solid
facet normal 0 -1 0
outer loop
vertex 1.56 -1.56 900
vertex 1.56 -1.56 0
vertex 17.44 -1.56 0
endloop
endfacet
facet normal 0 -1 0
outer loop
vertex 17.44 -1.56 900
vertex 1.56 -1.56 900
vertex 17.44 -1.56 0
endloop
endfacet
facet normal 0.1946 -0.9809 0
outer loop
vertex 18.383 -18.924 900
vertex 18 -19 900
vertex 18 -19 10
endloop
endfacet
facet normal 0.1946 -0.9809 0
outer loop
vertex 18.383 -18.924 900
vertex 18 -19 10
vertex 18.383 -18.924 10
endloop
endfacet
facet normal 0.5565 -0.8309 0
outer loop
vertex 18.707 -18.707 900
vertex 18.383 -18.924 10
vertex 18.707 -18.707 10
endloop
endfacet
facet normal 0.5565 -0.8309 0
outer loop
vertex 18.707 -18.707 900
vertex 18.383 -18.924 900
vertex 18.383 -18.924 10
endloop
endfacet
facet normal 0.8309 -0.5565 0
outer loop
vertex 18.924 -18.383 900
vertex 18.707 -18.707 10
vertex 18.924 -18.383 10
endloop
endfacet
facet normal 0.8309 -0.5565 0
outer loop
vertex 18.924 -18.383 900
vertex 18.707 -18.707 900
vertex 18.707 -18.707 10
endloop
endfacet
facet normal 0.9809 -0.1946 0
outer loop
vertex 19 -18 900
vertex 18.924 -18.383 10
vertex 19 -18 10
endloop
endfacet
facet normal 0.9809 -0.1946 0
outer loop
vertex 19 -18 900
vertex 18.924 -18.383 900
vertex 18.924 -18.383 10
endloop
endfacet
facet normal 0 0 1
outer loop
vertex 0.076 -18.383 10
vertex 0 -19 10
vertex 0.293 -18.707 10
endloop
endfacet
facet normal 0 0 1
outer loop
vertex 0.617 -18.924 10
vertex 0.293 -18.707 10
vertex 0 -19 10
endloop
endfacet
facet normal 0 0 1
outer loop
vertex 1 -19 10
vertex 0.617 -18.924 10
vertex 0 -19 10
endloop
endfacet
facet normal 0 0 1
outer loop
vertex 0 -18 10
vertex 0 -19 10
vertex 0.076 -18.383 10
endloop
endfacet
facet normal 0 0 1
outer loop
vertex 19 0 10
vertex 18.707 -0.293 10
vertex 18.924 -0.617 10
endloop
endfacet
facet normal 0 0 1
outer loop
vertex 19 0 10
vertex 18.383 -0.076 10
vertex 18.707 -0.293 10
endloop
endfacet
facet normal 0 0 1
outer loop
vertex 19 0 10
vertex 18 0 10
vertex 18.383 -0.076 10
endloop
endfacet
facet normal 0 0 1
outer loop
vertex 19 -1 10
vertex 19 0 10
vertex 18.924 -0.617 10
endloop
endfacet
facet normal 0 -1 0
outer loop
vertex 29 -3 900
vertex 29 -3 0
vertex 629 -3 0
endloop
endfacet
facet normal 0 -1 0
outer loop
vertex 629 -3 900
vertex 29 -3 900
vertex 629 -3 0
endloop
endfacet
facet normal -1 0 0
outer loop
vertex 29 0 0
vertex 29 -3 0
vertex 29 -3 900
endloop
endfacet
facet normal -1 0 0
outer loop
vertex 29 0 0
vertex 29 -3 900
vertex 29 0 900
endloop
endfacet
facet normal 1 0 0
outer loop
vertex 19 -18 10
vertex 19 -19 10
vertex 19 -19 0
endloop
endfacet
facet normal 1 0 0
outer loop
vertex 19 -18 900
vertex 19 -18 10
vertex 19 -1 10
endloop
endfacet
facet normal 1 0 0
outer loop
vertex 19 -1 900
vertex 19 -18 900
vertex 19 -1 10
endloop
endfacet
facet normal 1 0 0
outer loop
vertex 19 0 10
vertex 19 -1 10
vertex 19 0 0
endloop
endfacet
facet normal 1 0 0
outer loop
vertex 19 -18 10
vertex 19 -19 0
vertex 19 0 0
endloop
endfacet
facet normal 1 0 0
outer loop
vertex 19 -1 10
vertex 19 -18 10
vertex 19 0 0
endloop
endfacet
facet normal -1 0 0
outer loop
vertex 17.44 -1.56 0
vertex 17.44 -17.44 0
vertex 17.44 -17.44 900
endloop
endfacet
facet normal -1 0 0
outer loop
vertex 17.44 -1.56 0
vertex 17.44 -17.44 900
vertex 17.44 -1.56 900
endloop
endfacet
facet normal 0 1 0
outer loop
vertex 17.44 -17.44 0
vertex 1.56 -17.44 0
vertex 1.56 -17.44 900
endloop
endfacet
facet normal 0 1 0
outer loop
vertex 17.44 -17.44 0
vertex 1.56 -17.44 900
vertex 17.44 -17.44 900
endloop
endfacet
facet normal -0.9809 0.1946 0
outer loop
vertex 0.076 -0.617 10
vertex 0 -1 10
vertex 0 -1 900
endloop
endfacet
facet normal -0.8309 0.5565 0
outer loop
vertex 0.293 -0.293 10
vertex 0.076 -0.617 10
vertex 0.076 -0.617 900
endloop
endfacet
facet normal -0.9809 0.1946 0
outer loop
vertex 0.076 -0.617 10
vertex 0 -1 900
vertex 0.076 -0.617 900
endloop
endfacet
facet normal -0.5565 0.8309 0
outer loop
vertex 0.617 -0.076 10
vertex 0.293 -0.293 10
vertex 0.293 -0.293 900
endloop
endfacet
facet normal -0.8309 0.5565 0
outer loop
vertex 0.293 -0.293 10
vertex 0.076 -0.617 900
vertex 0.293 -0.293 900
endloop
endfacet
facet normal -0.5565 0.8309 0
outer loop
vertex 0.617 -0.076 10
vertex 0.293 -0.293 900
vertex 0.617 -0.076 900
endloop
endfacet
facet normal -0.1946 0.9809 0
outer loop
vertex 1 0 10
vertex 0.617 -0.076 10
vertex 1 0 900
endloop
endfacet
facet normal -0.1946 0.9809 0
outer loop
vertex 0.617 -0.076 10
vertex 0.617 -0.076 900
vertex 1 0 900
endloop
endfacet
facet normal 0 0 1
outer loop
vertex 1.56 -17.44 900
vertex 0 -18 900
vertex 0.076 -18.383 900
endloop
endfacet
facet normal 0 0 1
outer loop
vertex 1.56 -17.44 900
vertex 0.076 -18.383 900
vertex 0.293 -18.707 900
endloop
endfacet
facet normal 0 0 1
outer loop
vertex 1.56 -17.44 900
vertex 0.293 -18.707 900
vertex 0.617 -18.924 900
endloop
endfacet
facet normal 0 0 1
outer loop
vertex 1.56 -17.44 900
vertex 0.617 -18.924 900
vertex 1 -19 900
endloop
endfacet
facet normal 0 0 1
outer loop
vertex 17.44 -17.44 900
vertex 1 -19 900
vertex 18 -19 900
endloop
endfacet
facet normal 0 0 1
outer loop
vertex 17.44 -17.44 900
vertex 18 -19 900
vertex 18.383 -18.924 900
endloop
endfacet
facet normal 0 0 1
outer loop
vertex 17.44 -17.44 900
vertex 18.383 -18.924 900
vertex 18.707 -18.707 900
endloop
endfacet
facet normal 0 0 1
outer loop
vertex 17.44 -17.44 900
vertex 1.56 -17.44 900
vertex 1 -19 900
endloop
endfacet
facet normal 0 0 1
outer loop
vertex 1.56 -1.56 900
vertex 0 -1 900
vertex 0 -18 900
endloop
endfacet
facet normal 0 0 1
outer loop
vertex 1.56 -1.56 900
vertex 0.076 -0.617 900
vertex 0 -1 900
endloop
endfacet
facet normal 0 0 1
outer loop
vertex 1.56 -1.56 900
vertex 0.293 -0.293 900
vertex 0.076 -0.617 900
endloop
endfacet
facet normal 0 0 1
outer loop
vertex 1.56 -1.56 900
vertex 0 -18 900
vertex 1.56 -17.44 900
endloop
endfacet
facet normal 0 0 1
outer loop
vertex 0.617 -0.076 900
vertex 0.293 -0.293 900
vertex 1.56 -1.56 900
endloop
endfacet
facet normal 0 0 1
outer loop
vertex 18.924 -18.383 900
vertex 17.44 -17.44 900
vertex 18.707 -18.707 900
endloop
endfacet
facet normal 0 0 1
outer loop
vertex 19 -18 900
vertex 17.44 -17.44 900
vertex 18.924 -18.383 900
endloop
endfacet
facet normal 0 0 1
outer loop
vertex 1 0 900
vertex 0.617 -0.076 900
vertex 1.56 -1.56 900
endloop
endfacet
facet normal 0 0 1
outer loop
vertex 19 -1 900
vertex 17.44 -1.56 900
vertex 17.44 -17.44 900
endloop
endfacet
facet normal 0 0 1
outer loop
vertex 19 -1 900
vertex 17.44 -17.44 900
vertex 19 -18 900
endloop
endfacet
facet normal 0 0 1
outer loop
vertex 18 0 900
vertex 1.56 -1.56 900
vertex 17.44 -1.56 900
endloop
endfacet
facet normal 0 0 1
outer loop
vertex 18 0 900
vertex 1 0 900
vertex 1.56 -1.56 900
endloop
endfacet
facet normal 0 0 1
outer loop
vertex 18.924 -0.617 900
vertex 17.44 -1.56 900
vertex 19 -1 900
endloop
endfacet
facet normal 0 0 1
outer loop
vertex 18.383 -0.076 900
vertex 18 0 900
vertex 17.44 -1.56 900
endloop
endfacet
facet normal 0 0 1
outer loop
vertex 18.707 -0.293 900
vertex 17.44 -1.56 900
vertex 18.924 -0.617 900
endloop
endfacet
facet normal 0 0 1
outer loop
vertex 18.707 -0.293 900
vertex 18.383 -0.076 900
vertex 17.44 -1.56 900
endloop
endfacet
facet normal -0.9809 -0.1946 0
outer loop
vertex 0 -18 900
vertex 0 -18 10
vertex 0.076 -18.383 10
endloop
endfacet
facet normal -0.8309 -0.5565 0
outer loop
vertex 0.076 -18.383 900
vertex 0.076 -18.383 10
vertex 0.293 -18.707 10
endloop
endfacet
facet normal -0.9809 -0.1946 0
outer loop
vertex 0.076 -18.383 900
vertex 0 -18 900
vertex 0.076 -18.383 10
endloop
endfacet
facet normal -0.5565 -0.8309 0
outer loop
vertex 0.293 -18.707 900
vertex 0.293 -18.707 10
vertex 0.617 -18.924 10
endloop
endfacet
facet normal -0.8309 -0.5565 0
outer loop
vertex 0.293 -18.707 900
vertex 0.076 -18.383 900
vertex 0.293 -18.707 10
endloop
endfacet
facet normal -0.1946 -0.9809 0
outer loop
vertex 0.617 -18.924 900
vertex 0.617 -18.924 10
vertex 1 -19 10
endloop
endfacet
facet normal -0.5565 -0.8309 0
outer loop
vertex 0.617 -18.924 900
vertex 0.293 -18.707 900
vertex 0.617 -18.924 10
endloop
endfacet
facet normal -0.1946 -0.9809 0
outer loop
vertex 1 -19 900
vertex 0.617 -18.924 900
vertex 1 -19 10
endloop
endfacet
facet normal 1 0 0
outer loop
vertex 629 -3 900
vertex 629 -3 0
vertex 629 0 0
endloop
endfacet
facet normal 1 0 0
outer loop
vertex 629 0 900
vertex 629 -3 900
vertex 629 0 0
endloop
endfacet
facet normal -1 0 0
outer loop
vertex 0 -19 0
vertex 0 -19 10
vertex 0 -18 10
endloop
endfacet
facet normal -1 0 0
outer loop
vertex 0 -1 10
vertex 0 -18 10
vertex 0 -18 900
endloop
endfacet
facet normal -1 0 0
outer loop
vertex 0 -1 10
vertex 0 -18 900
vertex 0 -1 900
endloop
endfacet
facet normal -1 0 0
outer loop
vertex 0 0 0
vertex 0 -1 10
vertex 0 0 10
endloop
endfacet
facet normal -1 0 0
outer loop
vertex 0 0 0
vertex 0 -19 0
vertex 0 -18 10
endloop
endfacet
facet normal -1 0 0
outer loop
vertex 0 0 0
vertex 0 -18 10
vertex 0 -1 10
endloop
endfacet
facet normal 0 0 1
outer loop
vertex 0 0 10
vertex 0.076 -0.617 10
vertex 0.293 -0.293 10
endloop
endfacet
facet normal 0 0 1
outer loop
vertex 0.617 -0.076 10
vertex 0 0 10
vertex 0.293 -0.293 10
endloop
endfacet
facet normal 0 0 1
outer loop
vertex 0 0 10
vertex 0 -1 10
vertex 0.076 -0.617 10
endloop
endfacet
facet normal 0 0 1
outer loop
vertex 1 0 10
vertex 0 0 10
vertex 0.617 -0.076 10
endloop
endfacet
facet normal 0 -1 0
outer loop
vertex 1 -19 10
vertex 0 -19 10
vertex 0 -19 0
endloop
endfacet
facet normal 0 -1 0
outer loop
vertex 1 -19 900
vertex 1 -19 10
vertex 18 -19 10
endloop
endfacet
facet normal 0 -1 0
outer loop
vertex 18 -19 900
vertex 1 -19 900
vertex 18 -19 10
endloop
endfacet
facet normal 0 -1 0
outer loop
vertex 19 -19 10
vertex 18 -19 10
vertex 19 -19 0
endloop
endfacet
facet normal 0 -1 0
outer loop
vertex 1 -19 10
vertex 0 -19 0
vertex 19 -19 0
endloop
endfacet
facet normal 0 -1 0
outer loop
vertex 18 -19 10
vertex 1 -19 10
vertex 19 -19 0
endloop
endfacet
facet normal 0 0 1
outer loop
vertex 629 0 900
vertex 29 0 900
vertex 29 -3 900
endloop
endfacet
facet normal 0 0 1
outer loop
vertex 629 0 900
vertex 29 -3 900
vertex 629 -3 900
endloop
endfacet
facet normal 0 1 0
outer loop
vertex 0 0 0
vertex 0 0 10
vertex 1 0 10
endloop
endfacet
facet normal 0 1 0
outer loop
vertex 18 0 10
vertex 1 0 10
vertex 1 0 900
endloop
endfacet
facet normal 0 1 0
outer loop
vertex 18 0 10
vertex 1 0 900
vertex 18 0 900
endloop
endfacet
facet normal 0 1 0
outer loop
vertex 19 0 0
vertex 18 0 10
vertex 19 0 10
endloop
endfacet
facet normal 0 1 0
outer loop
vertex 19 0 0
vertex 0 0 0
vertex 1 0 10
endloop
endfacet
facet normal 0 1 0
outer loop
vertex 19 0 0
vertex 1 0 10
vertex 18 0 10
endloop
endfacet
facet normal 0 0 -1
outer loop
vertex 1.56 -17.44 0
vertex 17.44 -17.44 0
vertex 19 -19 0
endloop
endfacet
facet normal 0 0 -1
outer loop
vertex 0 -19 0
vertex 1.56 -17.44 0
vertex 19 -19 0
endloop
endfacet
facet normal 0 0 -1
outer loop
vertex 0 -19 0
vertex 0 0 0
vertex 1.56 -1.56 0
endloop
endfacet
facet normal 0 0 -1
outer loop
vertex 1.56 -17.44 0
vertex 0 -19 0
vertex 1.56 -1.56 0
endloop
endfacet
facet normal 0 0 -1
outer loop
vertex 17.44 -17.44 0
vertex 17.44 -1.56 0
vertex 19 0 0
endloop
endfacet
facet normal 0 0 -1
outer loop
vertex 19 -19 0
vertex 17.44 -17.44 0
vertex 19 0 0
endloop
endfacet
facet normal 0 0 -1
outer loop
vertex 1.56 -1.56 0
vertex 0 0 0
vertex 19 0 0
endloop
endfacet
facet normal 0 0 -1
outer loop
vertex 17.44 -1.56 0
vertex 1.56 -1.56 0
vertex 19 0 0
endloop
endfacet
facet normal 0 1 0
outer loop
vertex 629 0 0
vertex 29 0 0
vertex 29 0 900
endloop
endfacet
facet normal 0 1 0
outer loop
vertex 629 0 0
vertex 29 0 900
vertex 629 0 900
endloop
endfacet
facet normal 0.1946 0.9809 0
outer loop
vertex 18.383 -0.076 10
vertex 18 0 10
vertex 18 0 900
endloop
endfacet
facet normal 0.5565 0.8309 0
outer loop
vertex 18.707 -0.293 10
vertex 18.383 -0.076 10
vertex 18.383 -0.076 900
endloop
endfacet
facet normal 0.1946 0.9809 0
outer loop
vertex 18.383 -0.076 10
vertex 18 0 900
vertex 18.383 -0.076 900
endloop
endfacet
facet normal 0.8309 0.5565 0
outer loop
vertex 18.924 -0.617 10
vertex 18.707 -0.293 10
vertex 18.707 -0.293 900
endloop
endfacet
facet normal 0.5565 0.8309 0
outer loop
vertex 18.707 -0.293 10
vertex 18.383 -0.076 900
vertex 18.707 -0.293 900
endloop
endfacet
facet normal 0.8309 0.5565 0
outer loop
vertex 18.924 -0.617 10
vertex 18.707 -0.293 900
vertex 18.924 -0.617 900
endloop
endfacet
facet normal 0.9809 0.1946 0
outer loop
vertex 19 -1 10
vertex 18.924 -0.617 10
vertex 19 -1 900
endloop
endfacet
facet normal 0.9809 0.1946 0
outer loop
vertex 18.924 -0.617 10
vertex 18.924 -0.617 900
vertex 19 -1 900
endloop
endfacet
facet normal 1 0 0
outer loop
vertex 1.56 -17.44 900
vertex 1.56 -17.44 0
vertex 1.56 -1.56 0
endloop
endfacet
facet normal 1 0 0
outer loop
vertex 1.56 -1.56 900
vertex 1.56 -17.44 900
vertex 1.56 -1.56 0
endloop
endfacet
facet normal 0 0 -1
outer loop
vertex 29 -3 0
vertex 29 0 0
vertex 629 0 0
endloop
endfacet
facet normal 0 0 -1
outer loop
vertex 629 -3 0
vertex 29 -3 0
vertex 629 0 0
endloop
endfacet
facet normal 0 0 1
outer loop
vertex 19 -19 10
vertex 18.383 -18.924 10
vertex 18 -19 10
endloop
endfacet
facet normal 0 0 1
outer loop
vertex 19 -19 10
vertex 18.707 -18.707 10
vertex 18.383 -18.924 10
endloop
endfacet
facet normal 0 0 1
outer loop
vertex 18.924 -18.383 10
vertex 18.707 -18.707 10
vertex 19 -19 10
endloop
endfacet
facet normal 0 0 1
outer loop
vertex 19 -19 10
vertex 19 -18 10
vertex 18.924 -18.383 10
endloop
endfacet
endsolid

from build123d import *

# Parameters (mm, degrees)
SKETCH_1_W        = 19
SKETCH_1_H        = 19
SKETCH_1_W_2      = 15.88
SKETCH_1_H_2      = 15.88
EXTRUDE_1_DEPTH   = 900
SKETCH_1_W_3      = 600
SKETCH_1_H_3      = 3
EXTRUDE_1_2_DEPTH = 900
FILLET_2_R        = 1
SKETCH_1_2_W      = 19
SKETCH_1_2_H      = 19
SKETCH_1_2_W_2    = 15.88
SKETCH_1_2_H_2    = 15.88
SKETCH_1_2_W_3    = 600
SKETCH_1_2_H_3    = 3
EXTRUDE_2_DEPTH   = 10


with BuildPart() as part:
    # 스케치1 → 보스-돌출1 (new body)
    with BuildSketch(Plane.XY):
        with Locations((9.5, -9.5)):
            Rectangle(SKETCH_1_W, SKETCH_1_H)
        with Locations((9.5, -9.5)):
            Rectangle(SKETCH_1_W_2, SKETCH_1_H_2, mode=Mode.SUBTRACT)
    extrude(amount=EXTRUDE_1_DEPTH)

    # 필렛2
    fillet_2_edges = [part.edges().sort_by_distance(p)[0] for p in [
        (0, -19, 450),
        (0, 0, 450),
        (19, -19, 450),
        (19, 0, 450),
    ]]
    fillet(fillet_2_edges, radius=FILLET_2_R)



with BuildPart() as body_2:
    # 스케치1 → Extrude 1 2 (new body)
    with BuildSketch(Plane.XY):
        with Locations((329, -1.5)):
            Rectangle(SKETCH_1_W_3, SKETCH_1_H_3)
    extrude(amount=EXTRUDE_1_2_DEPTH)


with BuildPart() as part_1:
    add(part.part)

    add(body_2.part)  # 보스-돌출2 merges body 2
    # 스케치1<2> → 보스-돌출2 (add)
    # profile 1 of 2: a face of its own
    with BuildSketch(Plane.XY):
        with Locations((9.5, -9.5)):
            Rectangle(SKETCH_1_2_W, SKETCH_1_2_H)
        with Locations((9.5, -9.5)):
            Rectangle(SKETCH_1_2_W_2, SKETCH_1_2_H_2, mode=Mode.SUBTRACT)
    # profile 2 of 2: a face of its own
    with BuildSketch(Plane.XY):
        with Locations((329, -1.5)):
            Rectangle(SKETCH_1_2_W_3, SKETCH_1_2_H_3)
    extrude(amount=EXTRUDE_2_DEPTH)


solid = part_1.part
